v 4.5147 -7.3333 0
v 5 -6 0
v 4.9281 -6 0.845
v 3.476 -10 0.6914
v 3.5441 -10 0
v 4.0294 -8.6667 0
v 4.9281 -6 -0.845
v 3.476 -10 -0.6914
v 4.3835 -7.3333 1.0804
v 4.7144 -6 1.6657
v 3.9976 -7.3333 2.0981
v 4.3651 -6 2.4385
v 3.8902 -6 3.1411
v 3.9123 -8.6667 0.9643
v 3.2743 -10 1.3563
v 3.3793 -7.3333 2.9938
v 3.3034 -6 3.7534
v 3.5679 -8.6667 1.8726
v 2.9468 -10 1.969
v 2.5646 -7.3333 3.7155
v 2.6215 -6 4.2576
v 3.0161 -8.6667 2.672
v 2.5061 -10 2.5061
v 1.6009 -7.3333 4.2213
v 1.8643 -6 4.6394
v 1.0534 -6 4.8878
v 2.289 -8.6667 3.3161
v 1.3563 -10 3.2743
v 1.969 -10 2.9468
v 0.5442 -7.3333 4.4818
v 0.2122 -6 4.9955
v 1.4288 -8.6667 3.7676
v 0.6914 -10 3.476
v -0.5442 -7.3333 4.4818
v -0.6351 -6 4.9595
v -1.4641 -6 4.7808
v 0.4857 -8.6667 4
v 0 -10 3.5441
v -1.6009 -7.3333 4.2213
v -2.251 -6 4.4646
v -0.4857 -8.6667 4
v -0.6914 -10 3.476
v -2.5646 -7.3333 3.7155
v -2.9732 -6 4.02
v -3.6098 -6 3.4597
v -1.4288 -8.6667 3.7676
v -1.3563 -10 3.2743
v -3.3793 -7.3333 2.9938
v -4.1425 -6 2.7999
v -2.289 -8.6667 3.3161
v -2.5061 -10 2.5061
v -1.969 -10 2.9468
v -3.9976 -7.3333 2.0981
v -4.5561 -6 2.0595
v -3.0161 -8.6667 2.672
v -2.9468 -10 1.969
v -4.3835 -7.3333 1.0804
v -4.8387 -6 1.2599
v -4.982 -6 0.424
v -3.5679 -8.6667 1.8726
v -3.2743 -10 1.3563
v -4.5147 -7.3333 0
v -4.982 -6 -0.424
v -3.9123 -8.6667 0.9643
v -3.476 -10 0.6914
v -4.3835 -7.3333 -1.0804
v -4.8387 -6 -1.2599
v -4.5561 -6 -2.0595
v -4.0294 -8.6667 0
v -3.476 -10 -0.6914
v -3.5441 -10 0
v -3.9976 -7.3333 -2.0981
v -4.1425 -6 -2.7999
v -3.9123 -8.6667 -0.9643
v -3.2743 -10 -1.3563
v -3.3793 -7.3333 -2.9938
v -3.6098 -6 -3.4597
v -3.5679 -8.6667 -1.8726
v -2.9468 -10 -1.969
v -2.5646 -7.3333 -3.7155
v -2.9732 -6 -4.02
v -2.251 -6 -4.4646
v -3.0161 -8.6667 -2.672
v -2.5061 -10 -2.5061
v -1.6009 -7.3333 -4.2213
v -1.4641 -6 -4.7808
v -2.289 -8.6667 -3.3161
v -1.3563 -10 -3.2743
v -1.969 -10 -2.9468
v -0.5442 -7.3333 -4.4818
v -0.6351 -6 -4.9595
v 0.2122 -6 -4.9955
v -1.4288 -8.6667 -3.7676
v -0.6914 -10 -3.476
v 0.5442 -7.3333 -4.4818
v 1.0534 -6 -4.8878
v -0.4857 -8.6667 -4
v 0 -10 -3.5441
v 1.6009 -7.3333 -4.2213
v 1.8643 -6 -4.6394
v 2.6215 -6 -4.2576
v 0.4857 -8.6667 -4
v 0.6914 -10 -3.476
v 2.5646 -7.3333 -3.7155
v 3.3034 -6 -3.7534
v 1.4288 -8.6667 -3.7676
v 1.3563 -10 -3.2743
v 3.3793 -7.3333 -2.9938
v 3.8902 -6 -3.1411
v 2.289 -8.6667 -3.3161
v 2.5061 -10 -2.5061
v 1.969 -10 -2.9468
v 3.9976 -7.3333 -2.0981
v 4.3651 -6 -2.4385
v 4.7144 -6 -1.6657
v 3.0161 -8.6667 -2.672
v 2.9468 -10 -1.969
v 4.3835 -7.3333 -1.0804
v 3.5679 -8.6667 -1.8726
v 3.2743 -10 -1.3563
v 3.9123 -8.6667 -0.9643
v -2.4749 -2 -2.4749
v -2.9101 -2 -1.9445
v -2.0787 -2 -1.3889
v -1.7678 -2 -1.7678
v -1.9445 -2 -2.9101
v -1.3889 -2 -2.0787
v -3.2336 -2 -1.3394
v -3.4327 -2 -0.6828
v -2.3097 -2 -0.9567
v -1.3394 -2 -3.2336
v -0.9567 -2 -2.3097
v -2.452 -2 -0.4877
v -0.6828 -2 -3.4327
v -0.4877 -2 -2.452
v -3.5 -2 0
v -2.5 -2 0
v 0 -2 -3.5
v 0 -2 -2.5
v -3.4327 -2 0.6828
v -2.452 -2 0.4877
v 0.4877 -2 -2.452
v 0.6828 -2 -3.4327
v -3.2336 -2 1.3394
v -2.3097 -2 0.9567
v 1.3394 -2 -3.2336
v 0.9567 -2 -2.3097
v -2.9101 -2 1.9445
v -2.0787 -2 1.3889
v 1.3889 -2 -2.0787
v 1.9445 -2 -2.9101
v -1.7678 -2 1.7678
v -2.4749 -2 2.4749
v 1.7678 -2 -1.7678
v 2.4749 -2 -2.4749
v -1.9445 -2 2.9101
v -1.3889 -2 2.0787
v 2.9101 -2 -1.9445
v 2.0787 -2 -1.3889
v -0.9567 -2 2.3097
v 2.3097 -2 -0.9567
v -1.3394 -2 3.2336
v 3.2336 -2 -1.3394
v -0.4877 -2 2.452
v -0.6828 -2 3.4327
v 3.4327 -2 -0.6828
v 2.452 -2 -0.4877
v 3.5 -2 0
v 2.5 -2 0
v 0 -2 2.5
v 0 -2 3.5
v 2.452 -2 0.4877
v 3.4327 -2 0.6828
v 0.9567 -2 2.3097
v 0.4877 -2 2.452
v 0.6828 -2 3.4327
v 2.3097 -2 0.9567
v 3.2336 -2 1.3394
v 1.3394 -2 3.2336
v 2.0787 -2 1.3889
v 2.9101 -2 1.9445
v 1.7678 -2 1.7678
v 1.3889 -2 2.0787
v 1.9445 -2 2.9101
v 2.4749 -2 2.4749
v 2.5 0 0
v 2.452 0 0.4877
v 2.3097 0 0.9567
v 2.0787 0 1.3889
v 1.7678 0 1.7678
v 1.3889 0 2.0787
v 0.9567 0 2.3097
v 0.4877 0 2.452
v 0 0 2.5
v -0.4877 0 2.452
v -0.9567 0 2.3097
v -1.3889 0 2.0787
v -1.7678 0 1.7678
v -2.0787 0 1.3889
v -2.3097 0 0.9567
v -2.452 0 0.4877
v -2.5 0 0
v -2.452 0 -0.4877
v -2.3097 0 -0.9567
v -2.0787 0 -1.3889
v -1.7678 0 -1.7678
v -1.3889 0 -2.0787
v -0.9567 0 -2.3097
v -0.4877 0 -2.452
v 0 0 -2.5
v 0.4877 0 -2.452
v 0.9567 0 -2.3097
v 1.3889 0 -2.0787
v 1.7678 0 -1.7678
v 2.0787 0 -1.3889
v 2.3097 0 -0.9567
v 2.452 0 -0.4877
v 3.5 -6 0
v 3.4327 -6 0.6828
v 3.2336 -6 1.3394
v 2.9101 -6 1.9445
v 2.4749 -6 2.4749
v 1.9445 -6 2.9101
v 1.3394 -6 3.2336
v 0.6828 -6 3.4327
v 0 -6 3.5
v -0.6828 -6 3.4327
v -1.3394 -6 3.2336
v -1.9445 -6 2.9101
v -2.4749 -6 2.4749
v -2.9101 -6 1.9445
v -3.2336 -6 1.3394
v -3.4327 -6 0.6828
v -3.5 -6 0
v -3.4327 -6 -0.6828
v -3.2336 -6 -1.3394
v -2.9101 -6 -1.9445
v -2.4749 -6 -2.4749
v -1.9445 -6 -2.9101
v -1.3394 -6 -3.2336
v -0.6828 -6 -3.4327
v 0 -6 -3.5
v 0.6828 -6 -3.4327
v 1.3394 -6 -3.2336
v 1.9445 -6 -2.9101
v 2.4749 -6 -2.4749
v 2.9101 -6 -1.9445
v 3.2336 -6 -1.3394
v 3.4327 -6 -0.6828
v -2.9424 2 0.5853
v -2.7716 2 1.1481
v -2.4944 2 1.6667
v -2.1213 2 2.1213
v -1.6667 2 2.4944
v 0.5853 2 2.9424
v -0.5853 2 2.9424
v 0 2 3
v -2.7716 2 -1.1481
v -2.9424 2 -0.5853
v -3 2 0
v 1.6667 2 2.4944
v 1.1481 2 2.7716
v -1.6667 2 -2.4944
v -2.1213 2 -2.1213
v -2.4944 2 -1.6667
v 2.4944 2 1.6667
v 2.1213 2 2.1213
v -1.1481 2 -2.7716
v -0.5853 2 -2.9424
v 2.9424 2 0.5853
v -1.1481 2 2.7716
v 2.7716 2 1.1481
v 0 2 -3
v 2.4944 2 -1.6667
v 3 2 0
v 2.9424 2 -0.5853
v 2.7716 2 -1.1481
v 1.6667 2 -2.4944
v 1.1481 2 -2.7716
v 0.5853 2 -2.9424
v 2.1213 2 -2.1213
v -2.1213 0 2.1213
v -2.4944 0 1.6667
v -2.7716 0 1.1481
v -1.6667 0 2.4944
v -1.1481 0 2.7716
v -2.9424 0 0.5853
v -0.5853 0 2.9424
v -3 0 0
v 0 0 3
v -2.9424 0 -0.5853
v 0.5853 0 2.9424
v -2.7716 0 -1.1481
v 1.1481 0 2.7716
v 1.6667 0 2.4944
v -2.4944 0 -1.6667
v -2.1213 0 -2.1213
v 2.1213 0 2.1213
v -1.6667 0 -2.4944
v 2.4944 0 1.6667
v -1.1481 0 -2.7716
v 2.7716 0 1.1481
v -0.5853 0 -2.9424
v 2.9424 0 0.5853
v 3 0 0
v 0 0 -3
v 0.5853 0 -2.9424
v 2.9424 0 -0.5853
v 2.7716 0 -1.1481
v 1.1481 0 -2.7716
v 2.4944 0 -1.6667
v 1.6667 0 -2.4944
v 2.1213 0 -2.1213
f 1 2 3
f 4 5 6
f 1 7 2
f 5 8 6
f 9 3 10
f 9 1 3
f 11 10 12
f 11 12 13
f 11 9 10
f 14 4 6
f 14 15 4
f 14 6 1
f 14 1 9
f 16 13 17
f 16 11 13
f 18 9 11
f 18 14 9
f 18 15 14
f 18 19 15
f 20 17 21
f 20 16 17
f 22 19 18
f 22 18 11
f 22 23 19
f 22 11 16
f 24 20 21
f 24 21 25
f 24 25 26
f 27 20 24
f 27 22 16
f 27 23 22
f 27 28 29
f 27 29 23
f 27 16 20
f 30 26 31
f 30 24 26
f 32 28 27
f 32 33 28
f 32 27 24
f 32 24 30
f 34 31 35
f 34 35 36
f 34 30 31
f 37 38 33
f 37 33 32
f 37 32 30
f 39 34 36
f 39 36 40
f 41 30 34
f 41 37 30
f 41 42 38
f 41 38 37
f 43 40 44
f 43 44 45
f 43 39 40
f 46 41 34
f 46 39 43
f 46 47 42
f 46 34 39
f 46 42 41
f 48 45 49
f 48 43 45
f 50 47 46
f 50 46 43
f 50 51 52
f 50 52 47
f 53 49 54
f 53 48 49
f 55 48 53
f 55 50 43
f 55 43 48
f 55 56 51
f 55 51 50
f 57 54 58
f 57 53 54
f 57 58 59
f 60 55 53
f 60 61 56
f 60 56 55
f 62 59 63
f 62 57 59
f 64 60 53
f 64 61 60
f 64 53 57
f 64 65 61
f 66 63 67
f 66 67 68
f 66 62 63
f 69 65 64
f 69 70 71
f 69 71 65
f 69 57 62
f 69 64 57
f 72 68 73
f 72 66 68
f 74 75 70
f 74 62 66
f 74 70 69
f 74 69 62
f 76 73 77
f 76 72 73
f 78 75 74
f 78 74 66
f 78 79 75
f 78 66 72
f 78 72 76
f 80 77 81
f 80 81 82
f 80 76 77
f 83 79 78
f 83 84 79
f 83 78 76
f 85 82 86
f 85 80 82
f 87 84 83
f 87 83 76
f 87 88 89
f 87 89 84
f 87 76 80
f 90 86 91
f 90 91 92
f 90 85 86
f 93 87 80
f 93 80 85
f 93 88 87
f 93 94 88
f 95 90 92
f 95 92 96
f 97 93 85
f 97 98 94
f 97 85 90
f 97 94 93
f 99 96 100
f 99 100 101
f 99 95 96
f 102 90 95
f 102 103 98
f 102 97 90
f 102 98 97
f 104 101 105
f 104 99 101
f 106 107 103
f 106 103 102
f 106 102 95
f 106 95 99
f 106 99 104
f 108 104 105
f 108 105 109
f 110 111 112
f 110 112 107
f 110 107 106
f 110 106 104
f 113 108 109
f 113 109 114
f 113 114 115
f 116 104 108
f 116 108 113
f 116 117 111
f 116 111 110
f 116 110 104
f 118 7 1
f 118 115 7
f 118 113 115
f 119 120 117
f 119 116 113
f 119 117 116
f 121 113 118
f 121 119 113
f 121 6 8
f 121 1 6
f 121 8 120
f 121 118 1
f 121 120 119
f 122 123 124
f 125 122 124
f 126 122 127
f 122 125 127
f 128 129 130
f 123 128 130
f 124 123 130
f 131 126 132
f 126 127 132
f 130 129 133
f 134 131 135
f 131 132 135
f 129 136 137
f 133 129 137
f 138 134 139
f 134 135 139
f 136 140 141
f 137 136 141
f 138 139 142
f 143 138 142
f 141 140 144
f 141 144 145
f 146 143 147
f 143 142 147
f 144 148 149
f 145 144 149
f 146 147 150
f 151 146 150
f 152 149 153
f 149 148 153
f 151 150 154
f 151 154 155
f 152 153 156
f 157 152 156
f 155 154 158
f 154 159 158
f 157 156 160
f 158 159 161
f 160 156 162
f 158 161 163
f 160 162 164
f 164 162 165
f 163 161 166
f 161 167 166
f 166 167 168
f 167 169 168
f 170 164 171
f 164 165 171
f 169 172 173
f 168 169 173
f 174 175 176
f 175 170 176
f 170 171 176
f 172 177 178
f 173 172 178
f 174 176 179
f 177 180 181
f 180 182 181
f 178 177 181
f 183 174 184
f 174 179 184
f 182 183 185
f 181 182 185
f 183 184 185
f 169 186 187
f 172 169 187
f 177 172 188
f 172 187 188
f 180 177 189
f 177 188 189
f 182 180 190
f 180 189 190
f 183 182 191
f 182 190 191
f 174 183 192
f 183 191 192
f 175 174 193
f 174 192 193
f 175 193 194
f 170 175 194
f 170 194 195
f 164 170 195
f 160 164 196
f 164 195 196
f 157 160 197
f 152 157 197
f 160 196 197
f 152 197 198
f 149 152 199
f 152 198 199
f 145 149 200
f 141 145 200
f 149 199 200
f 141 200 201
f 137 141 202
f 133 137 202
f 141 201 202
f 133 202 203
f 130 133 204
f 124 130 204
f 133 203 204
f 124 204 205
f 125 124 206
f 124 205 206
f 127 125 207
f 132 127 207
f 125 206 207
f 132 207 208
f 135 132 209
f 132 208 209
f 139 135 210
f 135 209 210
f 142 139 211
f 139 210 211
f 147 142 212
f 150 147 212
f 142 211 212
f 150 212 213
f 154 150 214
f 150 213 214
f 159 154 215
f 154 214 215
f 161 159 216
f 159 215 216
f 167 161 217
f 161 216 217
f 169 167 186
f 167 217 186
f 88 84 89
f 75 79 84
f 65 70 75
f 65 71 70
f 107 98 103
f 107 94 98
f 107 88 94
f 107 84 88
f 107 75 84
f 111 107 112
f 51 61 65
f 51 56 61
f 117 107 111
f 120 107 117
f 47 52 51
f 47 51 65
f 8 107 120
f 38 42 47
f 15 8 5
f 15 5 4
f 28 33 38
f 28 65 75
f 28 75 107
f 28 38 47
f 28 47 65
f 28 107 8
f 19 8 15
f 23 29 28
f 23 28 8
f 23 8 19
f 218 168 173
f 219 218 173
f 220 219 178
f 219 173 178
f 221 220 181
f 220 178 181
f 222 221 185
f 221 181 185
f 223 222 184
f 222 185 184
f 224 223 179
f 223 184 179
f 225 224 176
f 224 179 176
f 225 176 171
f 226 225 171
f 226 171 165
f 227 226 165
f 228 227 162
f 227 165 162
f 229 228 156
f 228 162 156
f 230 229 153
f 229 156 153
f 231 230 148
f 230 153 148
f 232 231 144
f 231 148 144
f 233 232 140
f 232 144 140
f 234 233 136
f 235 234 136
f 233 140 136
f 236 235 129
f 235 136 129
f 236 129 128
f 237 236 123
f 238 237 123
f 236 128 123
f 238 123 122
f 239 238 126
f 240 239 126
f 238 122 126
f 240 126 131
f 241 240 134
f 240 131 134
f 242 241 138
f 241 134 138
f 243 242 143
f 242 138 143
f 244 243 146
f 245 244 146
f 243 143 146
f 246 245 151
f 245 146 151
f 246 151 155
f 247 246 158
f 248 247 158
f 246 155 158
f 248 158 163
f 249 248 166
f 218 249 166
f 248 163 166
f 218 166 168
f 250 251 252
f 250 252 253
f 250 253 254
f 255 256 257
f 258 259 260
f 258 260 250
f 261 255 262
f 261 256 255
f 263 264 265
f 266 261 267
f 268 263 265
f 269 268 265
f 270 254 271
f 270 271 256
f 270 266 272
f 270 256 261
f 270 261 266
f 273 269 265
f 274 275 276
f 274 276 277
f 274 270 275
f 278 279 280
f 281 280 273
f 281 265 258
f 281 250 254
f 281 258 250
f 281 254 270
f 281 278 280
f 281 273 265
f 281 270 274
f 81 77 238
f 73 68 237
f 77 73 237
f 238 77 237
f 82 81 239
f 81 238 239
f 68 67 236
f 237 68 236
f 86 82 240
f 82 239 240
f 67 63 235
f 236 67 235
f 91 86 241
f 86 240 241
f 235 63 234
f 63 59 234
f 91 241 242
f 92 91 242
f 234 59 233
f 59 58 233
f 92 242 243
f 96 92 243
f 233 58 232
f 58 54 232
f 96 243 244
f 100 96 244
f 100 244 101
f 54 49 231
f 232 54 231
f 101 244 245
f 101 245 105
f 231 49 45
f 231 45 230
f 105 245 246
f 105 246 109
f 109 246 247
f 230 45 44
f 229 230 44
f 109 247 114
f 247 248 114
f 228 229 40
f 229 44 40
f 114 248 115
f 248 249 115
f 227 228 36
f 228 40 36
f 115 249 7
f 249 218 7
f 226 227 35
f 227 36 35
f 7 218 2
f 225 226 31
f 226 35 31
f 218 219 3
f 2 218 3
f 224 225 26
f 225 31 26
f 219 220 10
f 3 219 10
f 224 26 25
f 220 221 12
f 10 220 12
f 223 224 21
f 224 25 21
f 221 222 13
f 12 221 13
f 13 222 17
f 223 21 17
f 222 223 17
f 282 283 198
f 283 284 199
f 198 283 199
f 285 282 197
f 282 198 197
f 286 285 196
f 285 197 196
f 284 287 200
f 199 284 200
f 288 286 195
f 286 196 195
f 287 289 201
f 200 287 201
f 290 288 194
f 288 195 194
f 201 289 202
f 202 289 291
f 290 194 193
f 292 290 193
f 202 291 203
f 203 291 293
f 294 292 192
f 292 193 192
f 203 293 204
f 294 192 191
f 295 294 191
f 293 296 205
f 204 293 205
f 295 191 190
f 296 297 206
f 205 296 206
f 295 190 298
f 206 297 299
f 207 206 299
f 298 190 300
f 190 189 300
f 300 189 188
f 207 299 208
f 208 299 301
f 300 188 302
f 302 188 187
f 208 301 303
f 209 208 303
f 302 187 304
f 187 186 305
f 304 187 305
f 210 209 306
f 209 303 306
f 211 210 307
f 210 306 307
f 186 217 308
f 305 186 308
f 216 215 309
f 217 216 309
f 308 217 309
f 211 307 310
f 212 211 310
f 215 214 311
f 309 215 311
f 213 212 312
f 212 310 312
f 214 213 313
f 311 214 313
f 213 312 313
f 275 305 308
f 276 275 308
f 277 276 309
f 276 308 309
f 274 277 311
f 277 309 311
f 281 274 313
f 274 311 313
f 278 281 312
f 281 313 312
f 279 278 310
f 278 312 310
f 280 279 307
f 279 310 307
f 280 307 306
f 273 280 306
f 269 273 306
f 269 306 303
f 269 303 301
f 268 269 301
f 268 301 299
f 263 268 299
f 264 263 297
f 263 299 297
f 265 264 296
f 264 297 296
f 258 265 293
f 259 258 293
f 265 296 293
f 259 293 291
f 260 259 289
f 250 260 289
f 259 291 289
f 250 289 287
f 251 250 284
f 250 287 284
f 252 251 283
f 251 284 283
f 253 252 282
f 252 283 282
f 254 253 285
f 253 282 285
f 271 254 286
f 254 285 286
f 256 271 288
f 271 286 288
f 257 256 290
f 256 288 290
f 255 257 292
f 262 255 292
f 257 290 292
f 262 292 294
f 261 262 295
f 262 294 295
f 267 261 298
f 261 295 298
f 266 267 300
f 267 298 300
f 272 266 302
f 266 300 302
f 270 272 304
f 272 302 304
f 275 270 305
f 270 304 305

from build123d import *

# Parameters (mm, degrees)
SKETCH1_R           = 3
BOSS_EXTRUDE1_DEPTH = 2
SKETCH2_R           = 2.5
BOSS_EXTRUDE2_DEPTH = 2
SKETCH3_R           = 3.5
BOSS_EXTRUDE3_DEPTH = 4
SKETCH4_R           = 5
BOSS_EXTRUDE4_DEPTH = 4
BOSS_EXTRUDE4_TAPER = 20


with BuildPart() as part:
    # Sketch1 → Boss-Extrude1 (new body)
    with BuildSketch(Plane(origin=(0, 0, 0), x_dir=(1, 0, 0), z_dir=(0, 1, 0))):
        Circle(SKETCH1_R)
    extrude(amount=BOSS_EXTRUDE1_DEPTH)

    # Sketch2 → Boss-Extrude2 (add)
    with BuildSketch(Plane.XZ):
        Circle(SKETCH2_R)
    extrude(amount=BOSS_EXTRUDE2_DEPTH)

    # Sketch3 → Boss-Extrude3 (add)
    with BuildSketch(Plane.XZ.offset(2)):
        Circle(SKETCH3_R)
    extrude(amount=BOSS_EXTRUDE3_DEPTH)

    # Sketch4 → Boss-Extrude4 (add)
    with BuildSketch(Plane.XZ.offset(6)):
        Circle(SKETCH4_R)
    extrude(amount=BOSS_EXTRUDE4_DEPTH, taper=BOSS_EXTRUDE4_TAPER)


solid = part.part
